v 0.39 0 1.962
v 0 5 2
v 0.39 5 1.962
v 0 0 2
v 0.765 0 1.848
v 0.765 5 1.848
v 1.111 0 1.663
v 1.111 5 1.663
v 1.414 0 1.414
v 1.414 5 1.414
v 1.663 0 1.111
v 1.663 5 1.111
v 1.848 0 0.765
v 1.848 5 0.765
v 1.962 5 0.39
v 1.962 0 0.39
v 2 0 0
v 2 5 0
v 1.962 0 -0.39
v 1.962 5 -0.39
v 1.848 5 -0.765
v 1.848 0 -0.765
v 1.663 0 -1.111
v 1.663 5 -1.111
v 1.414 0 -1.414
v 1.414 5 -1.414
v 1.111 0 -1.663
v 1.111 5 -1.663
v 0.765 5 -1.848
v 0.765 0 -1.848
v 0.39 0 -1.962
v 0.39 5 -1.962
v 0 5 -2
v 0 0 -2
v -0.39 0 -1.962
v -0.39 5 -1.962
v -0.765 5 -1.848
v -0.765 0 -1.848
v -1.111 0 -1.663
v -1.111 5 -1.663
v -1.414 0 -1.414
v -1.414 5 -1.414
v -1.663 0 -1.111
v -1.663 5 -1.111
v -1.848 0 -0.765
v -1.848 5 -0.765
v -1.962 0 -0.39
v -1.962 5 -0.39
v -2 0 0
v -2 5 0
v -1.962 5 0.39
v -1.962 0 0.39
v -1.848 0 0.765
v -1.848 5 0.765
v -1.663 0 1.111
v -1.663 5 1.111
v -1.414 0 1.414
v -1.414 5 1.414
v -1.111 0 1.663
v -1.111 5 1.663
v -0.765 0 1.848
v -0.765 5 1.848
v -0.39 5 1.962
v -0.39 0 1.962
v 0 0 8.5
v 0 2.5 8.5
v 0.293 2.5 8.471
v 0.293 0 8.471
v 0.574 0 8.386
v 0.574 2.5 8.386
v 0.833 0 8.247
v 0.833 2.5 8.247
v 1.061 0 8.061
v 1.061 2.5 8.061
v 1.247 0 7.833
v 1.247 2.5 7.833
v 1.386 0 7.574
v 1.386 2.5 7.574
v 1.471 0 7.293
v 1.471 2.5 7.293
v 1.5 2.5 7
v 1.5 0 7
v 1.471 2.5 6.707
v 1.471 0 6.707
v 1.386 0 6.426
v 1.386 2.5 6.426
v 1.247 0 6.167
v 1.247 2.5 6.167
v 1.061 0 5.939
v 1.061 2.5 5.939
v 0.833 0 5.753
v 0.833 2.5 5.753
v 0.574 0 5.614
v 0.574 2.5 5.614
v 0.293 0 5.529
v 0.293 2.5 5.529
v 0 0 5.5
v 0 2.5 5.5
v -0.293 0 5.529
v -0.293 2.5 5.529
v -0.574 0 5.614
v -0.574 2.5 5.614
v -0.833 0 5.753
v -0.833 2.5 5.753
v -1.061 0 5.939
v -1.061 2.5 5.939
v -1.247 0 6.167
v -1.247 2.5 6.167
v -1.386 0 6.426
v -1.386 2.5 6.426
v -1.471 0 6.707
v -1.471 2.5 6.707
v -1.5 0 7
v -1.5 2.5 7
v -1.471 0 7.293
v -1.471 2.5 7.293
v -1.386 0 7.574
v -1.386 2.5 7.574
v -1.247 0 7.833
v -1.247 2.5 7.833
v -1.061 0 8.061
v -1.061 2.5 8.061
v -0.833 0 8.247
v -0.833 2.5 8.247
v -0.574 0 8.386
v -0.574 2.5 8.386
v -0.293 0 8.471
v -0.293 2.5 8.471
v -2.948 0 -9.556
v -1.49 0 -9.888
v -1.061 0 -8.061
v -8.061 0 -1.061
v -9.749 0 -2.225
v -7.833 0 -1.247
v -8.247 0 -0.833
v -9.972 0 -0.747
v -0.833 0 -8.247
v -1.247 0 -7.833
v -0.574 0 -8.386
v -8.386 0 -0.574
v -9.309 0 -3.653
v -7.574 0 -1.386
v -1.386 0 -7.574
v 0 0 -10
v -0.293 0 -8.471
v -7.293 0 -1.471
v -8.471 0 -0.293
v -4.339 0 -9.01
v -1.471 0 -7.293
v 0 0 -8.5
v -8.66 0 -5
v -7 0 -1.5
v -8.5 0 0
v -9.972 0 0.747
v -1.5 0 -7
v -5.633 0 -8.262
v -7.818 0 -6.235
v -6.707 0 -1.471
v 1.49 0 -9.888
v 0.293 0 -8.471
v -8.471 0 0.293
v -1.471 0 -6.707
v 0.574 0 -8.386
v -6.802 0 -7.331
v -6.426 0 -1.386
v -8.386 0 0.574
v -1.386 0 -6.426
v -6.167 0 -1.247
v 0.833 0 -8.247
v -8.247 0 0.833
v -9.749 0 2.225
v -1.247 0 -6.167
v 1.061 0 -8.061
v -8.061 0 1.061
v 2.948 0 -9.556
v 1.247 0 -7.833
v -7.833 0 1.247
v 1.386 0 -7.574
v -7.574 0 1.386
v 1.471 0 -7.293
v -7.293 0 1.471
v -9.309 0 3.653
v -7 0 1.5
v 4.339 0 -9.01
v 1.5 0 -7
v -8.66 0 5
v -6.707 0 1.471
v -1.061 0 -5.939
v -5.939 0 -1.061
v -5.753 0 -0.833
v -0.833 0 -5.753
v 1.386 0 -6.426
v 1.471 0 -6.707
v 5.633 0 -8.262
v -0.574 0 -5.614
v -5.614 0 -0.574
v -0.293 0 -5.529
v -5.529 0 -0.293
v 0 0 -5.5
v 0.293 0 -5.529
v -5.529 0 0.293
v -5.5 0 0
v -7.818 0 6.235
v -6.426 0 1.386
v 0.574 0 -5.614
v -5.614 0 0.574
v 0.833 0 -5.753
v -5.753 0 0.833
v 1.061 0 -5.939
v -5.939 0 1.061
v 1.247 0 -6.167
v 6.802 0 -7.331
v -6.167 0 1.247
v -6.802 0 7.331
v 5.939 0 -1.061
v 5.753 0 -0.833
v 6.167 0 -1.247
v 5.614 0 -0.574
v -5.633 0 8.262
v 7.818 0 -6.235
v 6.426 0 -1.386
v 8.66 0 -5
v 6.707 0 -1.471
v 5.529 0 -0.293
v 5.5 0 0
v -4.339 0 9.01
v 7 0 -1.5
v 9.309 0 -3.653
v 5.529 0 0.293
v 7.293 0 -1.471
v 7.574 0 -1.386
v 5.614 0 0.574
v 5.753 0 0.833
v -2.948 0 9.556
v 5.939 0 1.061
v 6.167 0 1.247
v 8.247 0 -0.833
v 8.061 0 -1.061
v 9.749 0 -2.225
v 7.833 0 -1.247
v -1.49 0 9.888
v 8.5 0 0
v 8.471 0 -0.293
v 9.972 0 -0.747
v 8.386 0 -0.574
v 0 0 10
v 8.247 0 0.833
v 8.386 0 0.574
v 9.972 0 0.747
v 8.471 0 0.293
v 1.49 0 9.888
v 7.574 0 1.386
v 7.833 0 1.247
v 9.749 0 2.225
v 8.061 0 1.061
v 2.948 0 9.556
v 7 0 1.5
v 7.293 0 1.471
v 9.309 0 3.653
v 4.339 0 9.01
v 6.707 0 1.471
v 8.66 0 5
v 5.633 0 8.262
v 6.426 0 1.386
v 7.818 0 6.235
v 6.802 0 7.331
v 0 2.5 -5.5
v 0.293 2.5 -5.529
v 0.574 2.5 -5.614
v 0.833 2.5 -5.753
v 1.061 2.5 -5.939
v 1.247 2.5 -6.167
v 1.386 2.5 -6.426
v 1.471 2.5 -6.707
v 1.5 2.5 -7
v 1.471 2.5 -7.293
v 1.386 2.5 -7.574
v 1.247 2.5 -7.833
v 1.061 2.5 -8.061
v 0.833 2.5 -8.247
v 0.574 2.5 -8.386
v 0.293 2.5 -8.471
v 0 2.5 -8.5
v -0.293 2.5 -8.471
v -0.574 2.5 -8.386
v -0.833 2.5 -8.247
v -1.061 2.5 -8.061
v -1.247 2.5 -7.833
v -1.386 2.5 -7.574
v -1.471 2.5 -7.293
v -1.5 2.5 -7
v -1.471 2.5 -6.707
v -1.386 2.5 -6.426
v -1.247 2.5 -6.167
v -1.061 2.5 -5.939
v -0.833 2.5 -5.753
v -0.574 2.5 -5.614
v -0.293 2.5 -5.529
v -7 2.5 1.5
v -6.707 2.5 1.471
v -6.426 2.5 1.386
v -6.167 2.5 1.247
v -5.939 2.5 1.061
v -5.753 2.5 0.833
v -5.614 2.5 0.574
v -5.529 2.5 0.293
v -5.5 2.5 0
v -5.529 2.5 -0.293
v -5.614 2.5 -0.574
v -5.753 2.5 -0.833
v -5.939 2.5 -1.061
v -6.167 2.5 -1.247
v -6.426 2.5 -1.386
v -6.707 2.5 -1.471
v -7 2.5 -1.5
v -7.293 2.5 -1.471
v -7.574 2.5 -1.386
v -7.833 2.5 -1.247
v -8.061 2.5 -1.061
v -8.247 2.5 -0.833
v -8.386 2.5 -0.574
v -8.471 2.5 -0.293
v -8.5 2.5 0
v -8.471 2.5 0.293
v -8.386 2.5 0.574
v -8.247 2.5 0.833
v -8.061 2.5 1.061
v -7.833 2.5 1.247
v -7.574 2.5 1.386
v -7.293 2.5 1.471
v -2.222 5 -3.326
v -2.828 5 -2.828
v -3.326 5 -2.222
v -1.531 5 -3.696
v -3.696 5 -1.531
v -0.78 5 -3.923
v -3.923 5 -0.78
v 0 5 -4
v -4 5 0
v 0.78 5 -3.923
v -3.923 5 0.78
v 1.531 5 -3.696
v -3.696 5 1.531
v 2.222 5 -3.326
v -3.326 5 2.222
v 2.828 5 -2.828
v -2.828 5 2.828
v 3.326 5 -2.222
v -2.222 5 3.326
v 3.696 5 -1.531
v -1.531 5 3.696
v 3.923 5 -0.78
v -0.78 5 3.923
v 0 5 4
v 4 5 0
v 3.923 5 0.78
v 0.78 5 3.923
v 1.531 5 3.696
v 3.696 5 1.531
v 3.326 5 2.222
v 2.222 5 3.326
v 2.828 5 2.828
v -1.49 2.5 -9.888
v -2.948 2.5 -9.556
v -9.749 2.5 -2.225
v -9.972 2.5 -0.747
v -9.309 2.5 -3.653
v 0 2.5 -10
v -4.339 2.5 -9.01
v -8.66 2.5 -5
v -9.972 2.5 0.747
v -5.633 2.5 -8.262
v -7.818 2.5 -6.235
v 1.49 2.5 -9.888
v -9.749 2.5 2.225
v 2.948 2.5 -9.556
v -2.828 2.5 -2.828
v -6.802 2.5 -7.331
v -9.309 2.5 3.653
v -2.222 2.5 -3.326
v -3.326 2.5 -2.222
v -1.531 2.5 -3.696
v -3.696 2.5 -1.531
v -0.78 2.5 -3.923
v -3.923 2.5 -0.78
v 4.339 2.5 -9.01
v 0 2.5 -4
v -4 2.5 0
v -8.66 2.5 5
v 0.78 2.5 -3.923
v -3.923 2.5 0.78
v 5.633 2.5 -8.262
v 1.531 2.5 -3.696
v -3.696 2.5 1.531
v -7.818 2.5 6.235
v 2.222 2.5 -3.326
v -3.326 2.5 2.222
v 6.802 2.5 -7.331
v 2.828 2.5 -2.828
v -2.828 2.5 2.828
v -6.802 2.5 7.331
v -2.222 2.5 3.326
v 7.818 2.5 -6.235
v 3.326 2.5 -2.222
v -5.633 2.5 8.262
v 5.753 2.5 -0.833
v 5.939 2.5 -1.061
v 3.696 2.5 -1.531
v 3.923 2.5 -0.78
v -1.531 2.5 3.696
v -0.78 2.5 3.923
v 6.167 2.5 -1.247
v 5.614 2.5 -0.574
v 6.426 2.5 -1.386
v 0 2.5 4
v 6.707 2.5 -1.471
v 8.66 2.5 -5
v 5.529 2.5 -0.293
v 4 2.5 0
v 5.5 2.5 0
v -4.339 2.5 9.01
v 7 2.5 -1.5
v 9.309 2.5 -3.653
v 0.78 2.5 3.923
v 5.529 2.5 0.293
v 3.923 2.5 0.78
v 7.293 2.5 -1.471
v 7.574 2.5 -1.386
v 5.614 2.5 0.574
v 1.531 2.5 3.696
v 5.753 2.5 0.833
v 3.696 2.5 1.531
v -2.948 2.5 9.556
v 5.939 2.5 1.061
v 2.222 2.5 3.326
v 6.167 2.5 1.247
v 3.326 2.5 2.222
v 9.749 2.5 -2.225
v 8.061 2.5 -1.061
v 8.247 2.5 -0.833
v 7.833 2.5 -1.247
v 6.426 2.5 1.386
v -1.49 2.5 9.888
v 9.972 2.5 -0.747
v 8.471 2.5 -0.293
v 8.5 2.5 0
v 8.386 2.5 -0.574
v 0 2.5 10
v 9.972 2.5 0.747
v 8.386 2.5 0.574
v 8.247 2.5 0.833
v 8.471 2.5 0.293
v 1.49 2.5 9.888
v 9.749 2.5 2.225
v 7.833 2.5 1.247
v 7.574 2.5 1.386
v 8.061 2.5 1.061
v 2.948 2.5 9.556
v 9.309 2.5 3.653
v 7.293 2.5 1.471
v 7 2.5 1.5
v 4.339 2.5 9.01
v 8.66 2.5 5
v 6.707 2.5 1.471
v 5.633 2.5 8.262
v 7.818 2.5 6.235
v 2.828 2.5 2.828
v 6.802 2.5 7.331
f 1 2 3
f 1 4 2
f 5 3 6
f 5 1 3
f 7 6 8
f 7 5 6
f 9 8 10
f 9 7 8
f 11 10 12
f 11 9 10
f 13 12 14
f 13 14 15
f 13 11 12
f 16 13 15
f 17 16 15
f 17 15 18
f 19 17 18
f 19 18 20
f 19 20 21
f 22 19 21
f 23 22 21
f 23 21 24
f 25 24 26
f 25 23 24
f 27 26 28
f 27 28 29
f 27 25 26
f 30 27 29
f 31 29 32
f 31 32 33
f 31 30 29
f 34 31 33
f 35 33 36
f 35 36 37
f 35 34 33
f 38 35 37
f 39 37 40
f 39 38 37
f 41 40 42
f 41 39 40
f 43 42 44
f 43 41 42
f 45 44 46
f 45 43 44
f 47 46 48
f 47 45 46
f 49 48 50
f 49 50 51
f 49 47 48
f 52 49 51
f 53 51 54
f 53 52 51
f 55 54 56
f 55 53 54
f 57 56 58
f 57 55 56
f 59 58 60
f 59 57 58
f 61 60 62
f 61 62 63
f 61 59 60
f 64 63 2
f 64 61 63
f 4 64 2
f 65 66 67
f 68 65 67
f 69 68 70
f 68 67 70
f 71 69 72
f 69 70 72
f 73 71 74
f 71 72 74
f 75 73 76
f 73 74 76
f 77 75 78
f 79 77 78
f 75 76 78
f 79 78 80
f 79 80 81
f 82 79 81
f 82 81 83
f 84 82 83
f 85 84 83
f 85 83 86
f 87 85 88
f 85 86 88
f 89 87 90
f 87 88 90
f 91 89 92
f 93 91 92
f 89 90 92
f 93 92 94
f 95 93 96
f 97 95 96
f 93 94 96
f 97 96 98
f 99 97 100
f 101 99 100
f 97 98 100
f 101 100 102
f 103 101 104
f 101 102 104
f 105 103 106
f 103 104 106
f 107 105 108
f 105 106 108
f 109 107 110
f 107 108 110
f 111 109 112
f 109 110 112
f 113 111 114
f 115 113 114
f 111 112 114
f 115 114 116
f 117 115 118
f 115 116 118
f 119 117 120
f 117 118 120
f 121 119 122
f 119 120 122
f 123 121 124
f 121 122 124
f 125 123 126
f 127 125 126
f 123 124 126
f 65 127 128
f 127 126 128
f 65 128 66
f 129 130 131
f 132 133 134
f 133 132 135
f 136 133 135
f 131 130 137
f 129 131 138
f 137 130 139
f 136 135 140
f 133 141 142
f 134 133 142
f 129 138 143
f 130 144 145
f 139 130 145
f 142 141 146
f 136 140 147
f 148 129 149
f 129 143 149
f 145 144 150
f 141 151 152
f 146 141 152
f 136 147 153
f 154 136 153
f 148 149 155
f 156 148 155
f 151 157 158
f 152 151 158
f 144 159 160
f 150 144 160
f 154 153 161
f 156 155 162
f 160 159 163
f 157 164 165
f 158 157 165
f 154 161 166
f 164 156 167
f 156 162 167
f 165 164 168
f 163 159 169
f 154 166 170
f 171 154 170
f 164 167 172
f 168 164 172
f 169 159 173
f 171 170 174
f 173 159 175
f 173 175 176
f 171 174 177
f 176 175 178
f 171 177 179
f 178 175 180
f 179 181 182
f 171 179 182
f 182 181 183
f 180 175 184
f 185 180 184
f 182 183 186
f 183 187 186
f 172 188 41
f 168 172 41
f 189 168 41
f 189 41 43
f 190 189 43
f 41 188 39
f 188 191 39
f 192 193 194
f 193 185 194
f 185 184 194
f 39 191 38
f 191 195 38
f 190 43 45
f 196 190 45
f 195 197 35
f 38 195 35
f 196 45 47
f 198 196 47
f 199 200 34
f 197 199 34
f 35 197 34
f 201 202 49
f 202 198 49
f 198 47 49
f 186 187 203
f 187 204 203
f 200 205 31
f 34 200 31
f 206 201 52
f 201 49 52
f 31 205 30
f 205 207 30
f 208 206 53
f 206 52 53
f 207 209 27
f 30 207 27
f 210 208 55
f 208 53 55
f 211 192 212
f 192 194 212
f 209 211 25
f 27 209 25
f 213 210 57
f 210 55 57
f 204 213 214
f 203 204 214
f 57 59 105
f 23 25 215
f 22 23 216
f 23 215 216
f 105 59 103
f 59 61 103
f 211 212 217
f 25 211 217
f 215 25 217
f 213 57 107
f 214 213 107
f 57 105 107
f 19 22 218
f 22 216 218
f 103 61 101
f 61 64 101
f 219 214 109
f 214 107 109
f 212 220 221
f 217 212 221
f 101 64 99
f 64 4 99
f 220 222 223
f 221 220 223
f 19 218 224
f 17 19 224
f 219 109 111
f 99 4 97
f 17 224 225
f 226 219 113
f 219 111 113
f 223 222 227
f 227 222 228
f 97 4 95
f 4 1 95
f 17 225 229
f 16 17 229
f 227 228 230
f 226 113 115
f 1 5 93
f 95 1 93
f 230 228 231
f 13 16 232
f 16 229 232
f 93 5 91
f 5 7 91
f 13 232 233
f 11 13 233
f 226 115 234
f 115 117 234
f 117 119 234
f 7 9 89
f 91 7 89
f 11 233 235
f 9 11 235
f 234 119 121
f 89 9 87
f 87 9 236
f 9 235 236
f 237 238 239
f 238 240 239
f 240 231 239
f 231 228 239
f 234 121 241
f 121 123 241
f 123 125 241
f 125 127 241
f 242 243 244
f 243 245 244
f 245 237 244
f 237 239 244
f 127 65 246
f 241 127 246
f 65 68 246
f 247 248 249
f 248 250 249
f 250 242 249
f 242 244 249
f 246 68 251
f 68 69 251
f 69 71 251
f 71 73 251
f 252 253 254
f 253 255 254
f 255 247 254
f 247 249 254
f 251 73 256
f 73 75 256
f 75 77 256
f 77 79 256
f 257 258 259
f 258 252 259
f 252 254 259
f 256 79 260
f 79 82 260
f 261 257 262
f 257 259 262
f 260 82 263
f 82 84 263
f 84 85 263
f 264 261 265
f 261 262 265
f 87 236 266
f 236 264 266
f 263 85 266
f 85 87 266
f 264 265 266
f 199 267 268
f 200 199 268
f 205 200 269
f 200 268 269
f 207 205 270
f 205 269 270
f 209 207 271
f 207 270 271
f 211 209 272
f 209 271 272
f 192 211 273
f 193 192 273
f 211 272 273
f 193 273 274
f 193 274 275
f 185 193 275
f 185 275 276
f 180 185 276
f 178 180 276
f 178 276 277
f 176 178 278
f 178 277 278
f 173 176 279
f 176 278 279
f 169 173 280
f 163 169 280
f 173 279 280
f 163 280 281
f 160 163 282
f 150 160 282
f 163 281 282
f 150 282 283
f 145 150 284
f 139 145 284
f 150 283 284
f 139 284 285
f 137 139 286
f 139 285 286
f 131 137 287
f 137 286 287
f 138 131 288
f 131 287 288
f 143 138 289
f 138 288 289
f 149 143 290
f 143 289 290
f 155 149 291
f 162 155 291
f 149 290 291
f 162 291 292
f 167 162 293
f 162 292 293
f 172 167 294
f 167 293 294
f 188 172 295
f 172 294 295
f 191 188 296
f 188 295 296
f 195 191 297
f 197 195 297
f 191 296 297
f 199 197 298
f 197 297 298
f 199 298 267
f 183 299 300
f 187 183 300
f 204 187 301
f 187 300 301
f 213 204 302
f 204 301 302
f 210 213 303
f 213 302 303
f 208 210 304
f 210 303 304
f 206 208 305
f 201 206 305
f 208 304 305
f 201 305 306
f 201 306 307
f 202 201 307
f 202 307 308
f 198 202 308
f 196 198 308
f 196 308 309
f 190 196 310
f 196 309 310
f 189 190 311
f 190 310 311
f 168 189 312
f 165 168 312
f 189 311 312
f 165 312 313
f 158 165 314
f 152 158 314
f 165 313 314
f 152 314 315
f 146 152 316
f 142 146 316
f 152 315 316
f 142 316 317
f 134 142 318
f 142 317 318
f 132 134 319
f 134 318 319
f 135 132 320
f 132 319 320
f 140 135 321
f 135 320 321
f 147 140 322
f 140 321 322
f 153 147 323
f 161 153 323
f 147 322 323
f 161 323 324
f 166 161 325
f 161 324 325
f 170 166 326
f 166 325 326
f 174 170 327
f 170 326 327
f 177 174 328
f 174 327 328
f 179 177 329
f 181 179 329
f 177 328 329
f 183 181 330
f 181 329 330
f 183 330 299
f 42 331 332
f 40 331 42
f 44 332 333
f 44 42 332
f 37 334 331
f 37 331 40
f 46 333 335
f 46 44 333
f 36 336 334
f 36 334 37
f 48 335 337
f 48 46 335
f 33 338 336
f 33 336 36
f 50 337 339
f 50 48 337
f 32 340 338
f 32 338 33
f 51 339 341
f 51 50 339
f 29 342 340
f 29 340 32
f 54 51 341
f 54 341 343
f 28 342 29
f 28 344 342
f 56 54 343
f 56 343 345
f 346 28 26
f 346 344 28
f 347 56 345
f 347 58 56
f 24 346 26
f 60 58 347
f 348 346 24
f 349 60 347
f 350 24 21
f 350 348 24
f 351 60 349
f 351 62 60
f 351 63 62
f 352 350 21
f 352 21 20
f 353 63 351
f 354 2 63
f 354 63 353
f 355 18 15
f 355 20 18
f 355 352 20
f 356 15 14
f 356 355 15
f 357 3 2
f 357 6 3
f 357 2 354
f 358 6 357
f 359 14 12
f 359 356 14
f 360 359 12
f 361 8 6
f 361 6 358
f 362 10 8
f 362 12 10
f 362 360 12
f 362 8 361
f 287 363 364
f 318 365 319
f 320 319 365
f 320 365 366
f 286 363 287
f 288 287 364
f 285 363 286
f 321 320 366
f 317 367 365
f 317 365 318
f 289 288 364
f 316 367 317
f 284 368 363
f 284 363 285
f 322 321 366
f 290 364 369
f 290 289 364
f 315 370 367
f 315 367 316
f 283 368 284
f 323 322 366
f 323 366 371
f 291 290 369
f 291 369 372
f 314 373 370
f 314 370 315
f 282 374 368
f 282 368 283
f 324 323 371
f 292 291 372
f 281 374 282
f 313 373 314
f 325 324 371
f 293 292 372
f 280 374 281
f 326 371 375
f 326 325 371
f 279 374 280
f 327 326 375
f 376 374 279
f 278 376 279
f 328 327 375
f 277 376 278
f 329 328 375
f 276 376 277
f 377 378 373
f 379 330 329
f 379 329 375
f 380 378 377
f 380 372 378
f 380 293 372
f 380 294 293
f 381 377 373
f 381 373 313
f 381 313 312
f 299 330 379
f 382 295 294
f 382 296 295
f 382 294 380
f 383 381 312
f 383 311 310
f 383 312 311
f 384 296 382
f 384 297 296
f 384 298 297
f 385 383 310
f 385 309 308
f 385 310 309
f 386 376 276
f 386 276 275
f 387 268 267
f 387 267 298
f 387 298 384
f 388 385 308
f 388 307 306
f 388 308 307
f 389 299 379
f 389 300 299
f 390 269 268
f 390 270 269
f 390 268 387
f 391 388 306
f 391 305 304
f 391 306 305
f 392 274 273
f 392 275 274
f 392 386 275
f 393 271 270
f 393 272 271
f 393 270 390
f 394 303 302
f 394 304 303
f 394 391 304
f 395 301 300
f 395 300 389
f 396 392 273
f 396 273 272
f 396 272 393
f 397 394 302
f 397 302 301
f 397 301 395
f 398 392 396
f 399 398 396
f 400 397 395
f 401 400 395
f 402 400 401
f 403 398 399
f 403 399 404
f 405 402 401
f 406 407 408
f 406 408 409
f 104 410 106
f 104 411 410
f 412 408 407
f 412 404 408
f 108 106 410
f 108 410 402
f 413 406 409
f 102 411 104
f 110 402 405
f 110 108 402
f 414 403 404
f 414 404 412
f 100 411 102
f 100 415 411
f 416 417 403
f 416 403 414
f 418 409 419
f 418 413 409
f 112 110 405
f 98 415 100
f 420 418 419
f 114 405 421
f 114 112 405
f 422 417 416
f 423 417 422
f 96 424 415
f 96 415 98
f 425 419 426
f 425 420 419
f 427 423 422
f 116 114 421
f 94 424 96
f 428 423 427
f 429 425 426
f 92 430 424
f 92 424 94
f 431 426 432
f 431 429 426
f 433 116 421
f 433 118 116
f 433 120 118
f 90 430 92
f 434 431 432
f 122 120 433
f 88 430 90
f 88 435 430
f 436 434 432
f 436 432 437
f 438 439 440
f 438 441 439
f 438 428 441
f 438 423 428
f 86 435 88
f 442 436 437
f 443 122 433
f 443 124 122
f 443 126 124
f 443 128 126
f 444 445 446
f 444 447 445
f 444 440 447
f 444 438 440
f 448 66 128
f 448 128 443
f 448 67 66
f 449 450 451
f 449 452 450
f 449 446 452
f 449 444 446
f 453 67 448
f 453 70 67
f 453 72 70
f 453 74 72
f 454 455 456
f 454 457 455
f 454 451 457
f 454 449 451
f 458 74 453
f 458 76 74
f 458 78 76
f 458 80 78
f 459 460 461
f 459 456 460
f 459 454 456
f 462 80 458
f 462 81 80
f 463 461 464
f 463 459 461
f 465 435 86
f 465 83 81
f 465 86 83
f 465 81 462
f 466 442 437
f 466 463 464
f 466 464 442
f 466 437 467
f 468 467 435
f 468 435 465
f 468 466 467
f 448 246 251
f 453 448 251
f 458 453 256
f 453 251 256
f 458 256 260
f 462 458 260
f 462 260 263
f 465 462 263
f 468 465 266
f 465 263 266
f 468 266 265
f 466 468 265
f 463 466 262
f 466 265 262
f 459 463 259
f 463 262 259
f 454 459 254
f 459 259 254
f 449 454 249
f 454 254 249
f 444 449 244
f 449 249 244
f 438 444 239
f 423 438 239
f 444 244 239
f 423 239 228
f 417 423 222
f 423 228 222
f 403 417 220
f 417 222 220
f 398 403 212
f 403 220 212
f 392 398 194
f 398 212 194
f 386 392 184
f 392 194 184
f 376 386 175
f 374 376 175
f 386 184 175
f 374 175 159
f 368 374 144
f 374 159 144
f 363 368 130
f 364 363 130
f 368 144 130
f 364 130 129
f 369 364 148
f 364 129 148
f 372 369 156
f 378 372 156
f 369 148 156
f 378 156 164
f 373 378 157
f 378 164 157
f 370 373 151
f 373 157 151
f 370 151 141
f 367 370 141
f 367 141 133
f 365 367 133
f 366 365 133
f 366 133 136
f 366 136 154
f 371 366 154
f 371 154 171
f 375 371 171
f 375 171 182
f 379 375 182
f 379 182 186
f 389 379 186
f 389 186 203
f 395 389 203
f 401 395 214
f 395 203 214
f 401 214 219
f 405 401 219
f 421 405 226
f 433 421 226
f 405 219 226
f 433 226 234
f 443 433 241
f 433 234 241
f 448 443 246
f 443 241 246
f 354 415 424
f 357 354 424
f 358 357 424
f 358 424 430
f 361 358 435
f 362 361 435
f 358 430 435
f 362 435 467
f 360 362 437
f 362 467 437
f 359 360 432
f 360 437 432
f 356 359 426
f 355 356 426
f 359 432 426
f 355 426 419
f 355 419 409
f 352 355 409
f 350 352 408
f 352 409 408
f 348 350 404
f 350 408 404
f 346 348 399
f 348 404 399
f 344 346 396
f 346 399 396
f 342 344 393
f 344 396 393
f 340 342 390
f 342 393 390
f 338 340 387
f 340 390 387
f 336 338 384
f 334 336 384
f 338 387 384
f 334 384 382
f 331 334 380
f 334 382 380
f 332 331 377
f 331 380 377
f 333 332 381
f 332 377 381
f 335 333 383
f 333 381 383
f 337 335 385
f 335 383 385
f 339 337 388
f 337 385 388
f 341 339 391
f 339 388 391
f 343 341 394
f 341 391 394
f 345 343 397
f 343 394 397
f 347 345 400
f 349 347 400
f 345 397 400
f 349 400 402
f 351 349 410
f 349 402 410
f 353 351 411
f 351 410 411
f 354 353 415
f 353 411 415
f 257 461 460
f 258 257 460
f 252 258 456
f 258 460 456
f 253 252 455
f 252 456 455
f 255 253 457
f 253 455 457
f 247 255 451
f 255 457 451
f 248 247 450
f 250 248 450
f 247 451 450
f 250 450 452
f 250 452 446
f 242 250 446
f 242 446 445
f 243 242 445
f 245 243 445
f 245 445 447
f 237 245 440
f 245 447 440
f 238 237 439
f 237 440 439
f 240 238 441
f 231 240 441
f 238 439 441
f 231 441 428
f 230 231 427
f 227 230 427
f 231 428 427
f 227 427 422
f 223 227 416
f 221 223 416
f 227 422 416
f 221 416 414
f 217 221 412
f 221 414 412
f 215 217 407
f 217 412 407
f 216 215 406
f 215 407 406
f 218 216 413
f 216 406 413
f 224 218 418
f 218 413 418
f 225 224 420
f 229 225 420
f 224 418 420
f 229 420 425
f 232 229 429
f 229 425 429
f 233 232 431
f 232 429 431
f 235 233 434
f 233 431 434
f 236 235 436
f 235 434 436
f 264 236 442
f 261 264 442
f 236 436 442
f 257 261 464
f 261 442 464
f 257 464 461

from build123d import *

# Parameters (mm, degrees)
SKETCH_1_R          = 10
SKETCH_1_R_2        = 2
EXTRUDE_1_DEPTH     = 2.5
SKETCH_2_R          = 4
SKETCH_2_R_2        = 2
EXTRUDE_2_DEPTH     = 2.5
SKETCH_3_R          = 1.5
CUT_EXTRUDE_1_DEPTH = 2.5


with BuildPart() as part:
    # 草图1 → 凸台-拉伸1 (new body)
    with BuildSketch(Plane(origin=(0, 0, 0), x_dir=(1, 0, 0), z_dir=(0, 1, 0))):
        with Locations(Location((0, 0, 0), (0, 0, 270))):
            Circle(SKETCH_1_R)
        with Locations(Location((0, 0, 0), (0, 0, 270))):
            Circle(SKETCH_1_R_2, mode=Mode.SUBTRACT)
    extrude(amount=EXTRUDE_1_DEPTH)

    # 草图2 → 凸台-拉伸2 (add)
    with BuildSketch(Plane(origin=(0, 2.5, 0), x_dir=(1, 0, 0), z_dir=(0, 1, 0))):
        with Locations(Location((0, 0, 0), (0, 0, 270))):
            Circle(SKETCH_2_R)
        with Locations(Location((0, 0, 0), (0, 0, 270))):
            Circle(SKETCH_2_R_2, mode=Mode.SUBTRACT)
    extrude(amount=EXTRUDE_2_DEPTH)

    # 草图3 → 切除-拉伸1 (cut)
    with BuildSketch(Plane(origin=(0, 2.5, 0), x_dir=(1, 0, 0), z_dir=(0, 1, 0))):
        with Locations(Location((0, 7, 0), (0, 0, 270))):
            Circle(SKETCH_3_R)
        with Locations(Location((7, 0, 0), (0, 0, 270))):
            Circle(SKETCH_3_R)
        with Locations(Location((0, -7, 0), (0, 0, 270))):
            Circle(SKETCH_3_R)
        with Locations(Location((-7, 0, 0), (0, 0, 270))):
            Circle(SKETCH_3_R)
    extrude(amount=-CUT_EXTRUDE_1_DEPTH, mode=Mode.SUBTRACT)


solid = part.part
